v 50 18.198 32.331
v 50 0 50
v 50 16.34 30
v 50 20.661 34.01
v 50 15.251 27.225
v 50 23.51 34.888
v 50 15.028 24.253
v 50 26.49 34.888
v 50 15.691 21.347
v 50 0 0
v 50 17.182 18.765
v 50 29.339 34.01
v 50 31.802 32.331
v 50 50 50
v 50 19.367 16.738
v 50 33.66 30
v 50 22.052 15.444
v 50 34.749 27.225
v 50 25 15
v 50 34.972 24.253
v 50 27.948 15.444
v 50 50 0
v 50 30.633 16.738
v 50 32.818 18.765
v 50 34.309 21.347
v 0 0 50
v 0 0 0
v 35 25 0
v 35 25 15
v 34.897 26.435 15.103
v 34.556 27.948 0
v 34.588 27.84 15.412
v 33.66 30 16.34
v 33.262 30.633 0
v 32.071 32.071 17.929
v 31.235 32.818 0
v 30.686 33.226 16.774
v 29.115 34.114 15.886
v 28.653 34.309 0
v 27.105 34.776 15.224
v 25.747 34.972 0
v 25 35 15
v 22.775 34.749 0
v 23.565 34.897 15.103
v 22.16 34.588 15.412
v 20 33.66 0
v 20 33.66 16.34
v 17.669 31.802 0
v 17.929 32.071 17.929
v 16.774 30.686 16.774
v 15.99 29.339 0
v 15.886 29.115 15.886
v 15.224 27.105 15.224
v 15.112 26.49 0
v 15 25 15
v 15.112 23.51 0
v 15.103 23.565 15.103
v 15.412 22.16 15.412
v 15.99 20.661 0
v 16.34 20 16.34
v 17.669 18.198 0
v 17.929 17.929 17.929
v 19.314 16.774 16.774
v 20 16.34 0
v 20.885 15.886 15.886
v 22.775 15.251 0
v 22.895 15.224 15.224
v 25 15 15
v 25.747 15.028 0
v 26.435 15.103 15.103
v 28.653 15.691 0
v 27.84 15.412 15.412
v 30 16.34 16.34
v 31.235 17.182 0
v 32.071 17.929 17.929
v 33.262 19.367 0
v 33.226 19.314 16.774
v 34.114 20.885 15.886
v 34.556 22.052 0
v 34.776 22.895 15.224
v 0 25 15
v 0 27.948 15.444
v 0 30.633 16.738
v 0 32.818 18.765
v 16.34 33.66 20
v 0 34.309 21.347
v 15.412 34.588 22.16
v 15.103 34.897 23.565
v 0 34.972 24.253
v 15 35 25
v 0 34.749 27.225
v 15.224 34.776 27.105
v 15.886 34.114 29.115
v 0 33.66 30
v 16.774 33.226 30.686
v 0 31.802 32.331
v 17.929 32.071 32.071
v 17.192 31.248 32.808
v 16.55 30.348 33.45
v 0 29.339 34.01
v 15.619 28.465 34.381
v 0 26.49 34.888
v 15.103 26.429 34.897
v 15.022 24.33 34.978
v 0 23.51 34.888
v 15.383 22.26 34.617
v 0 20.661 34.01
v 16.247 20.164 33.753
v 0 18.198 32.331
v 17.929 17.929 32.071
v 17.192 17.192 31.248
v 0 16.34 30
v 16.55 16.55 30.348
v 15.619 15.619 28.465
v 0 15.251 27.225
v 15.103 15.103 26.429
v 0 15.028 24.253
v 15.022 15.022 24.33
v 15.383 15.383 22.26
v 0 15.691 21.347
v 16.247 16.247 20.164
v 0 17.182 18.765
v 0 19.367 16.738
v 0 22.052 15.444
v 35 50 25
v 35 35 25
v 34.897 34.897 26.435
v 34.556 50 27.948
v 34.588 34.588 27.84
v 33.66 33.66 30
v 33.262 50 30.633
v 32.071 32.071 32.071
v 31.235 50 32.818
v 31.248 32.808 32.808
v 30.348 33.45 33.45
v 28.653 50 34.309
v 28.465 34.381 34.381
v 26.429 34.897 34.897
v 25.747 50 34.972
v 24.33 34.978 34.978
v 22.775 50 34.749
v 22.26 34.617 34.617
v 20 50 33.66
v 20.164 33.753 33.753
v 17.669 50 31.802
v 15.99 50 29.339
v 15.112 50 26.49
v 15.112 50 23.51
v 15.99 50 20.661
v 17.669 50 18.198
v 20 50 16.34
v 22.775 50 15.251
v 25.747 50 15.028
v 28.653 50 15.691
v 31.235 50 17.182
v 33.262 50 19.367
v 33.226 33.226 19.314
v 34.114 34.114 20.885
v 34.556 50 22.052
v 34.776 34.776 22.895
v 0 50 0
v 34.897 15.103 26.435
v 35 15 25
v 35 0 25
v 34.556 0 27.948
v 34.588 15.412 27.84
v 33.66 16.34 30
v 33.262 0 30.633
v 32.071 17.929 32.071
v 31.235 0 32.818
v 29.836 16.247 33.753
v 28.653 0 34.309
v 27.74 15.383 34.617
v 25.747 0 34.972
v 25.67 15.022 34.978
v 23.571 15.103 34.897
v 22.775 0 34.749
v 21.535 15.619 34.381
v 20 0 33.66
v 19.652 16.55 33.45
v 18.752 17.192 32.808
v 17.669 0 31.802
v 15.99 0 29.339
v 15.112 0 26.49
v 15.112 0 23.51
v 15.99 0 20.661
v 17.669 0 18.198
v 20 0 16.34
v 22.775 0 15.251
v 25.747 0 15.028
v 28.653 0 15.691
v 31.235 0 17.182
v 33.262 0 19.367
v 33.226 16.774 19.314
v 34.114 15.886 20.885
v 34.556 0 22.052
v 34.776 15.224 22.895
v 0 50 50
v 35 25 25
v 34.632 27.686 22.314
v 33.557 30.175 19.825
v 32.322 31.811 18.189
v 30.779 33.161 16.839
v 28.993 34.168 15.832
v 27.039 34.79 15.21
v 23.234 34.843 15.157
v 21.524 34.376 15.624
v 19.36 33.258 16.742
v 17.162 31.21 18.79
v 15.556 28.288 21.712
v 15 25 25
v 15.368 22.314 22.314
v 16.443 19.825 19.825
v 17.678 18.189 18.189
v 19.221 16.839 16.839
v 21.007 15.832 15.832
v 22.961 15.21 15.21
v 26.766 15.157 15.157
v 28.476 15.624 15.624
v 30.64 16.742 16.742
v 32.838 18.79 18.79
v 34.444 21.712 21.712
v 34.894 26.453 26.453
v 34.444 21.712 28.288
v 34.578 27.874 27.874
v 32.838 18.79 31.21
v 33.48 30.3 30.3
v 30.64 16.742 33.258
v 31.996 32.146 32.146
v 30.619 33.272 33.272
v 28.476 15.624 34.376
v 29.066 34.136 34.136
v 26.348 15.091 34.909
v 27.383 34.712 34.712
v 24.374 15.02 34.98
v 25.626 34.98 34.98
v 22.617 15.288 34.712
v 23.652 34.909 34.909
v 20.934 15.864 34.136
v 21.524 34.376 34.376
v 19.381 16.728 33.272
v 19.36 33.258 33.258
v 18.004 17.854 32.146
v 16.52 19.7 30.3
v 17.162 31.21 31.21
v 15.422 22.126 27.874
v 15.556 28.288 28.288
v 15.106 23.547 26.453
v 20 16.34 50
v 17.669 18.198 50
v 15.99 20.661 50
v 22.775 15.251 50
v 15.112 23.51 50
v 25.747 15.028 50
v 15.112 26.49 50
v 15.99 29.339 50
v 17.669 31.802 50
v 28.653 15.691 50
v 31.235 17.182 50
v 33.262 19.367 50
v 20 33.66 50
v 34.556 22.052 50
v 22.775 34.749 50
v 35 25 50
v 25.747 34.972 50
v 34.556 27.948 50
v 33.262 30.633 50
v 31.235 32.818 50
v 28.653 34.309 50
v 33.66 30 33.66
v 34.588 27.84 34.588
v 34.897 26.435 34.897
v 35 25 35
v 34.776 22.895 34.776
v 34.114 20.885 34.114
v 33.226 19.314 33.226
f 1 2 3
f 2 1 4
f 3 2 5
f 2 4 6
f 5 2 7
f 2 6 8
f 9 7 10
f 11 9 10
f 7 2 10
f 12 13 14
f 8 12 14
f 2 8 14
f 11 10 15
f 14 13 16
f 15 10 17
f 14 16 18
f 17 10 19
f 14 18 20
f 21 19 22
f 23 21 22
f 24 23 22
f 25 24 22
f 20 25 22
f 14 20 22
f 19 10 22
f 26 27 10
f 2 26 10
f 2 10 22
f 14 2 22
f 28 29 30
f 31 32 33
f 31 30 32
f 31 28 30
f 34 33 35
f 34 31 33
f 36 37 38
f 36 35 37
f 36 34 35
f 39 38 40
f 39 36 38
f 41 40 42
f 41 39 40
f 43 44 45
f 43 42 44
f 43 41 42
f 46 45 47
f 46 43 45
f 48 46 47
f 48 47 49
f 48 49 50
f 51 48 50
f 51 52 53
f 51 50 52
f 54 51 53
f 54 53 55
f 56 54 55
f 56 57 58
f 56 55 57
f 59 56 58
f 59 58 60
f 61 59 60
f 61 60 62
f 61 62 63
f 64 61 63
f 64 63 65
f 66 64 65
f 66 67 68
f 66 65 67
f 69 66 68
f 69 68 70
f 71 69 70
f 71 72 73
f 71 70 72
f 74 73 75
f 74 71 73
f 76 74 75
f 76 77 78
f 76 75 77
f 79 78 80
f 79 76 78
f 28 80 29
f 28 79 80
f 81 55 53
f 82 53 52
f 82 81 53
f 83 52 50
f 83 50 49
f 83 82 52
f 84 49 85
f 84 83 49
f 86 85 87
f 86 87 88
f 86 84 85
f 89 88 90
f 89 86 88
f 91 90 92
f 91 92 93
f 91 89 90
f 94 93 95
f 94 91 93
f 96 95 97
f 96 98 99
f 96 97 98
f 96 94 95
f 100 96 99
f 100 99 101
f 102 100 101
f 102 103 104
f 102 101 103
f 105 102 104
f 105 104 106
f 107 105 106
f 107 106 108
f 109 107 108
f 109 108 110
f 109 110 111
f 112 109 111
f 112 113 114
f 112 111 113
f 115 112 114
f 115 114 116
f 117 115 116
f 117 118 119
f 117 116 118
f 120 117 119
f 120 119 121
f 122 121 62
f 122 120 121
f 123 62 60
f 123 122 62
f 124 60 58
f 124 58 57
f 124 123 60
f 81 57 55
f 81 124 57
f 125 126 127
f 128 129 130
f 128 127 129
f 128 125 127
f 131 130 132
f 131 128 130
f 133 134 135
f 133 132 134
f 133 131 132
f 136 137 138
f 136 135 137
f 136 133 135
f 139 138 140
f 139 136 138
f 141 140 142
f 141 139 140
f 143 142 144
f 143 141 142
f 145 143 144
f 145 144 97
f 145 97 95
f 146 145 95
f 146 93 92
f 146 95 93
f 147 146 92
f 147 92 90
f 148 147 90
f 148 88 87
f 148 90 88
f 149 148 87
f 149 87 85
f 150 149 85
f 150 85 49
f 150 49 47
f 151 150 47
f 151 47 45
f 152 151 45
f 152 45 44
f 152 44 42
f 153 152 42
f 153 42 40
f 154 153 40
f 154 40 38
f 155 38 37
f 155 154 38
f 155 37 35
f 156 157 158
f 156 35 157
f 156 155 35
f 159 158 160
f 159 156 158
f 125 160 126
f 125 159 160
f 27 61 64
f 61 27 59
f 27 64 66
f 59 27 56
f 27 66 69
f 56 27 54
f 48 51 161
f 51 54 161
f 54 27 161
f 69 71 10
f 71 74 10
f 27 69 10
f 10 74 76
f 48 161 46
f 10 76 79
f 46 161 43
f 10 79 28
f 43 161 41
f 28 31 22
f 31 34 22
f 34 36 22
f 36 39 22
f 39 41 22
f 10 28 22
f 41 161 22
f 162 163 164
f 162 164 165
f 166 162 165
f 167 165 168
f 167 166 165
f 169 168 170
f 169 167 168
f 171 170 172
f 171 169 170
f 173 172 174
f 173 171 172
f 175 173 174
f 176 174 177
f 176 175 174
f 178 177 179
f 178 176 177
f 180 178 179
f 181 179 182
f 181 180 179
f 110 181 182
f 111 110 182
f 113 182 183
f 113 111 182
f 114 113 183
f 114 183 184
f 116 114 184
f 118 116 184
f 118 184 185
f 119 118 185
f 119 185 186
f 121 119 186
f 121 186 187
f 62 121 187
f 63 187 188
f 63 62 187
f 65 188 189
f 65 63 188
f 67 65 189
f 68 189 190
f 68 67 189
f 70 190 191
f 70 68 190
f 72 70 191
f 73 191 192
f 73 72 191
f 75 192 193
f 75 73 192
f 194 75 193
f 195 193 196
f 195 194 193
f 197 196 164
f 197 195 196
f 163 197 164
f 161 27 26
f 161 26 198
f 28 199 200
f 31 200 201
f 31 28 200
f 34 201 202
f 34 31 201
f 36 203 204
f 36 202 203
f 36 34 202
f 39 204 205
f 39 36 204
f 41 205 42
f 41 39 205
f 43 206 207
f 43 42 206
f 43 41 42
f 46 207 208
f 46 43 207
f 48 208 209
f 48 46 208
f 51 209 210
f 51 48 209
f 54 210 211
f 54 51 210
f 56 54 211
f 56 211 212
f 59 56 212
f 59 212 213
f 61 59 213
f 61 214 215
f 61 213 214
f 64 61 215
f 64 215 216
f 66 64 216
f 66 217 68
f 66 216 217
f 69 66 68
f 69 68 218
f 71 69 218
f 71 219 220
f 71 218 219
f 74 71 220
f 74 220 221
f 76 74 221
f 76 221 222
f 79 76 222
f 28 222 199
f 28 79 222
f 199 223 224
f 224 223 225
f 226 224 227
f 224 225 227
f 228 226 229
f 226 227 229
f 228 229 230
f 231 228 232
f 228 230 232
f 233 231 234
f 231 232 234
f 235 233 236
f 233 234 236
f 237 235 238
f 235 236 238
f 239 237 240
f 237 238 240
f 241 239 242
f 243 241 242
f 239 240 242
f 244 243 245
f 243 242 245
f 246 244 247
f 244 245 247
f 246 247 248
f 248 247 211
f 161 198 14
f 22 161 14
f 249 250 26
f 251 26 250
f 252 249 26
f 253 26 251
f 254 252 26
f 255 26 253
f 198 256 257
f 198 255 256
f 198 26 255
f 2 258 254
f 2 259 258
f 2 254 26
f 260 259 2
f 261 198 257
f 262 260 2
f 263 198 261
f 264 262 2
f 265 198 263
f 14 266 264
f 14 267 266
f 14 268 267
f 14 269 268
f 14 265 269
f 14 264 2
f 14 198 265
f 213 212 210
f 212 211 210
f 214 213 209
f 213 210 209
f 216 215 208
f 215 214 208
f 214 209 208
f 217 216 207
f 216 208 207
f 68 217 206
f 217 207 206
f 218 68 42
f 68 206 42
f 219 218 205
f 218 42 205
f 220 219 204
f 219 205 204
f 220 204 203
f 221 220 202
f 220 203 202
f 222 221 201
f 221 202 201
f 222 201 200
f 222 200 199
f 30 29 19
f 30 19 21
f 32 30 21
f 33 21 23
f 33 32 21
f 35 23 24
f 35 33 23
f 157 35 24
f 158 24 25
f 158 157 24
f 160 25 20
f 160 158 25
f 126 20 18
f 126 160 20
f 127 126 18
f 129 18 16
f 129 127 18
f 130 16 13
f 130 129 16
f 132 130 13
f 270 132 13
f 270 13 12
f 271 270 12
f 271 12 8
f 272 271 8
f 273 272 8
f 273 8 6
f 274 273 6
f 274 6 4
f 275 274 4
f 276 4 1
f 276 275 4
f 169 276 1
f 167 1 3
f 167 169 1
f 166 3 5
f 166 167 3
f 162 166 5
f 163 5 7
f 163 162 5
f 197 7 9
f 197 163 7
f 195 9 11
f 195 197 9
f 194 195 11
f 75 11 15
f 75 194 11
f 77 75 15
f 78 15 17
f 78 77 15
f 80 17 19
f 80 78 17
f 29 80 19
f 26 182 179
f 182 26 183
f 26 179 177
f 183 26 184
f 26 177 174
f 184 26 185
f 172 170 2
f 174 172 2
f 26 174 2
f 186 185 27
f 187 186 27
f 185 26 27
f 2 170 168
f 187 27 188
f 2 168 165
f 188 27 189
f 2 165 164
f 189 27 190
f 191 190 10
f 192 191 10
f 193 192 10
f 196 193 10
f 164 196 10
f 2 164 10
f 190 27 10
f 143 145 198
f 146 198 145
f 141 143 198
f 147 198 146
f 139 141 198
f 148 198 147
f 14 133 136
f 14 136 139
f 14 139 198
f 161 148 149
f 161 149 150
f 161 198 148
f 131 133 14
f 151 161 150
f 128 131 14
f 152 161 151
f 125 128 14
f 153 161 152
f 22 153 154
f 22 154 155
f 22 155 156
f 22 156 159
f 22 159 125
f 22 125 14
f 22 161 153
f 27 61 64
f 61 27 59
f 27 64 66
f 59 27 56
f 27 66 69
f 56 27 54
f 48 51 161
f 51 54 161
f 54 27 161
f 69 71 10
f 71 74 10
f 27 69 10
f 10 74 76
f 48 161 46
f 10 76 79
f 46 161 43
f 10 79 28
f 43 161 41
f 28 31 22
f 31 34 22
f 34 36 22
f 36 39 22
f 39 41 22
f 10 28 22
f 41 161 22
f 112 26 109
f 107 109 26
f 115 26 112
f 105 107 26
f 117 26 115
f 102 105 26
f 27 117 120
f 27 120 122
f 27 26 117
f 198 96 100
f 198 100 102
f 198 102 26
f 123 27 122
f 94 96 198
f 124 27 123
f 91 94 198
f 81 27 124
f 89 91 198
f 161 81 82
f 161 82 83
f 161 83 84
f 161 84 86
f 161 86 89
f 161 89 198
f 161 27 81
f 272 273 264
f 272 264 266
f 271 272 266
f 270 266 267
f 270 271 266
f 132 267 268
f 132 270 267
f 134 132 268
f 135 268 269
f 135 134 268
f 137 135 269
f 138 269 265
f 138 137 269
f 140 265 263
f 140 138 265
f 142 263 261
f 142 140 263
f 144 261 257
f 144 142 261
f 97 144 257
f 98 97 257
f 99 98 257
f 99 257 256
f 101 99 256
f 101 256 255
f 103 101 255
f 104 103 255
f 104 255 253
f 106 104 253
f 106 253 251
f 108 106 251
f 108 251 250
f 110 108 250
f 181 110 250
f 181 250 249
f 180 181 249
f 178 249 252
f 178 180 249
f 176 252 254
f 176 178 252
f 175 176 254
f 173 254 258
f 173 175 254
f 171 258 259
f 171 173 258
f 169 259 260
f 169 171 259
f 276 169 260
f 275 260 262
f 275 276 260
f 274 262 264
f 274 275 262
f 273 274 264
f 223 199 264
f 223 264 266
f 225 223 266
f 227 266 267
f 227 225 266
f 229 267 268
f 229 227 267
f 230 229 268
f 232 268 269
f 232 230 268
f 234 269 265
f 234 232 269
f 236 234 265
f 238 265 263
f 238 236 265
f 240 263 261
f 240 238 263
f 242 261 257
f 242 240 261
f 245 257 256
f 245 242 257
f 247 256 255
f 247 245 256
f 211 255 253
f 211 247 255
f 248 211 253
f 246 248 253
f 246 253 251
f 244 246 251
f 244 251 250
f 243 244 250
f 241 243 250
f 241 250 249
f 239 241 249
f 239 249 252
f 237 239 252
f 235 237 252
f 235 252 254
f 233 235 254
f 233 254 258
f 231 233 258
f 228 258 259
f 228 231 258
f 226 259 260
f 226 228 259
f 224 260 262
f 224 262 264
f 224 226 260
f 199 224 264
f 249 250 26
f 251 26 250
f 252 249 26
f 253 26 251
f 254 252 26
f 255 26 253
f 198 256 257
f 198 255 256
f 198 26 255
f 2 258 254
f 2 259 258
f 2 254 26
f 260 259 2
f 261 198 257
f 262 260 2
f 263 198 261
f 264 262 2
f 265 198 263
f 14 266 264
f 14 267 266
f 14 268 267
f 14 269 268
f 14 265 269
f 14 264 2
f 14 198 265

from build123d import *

# Parameters (mm, degrees)
CYLINDER1_R     = 10
CYLINDER1_DEPTH = 50
CYLINDER_R      = 10
CYLINDER_DEPTH  = 50
BOX_W           = 50
BOX_H           = 50
BOX_DEPTH       = 50
CYLINDER2_R     = 10
CYLINDER2_DEPTH = 50


with BuildPart() as cylinder1:
    # Cylinder1 → Cylinder1 (new body)
    with BuildSketch(Plane(origin=(25, 50, 25), x_dir=(1, 0, 0), z_dir=(0, -1, 0))):
        Circle(CYLINDER1_R)
    extrude(amount=CYLINDER1_DEPTH)


with BuildPart() as cylinder:
    # Cylinder → Cylinder (new body)
    with BuildSketch(Plane(origin=(25, 25, 0), x_dir=(1, 0, 0), z_dir=(0, 0, 1))):
        Circle(CYLINDER_R)
    extrude(amount=CYLINDER_DEPTH)


with BuildPart() as cut:
    # Box → Box (new body)
    with BuildSketch(Plane.XY):
        with Locations((25, 25)):
            Rectangle(BOX_W, BOX_H)
    extrude(amount=BOX_DEPTH)

    # Cut: cut Cylinder
    add(cylinder.part, mode=Mode.SUBTRACT)


with BuildPart() as fusion:
    # Fusion base: copy of Cut
    add(cut.part)

    # Fusion: union Cylinder1
    add(cylinder1.part)


with BuildPart() as cylinder2:
    # Cylinder2 → Cylinder2 (new body)
    with BuildSketch(Plane(origin=(0, 25, 25), x_dir=(0, 0, -1), z_dir=(1, 0, 0))):
        Circle(CYLINDER2_R)
    extrude(amount=CYLINDER2_DEPTH)


with BuildPart() as cut2:
    # Cut1 base: copy of Cut
    add(cut.part)

    # Cut1: cut Cylinder1
    add(cylinder1.part, mode=Mode.SUBTRACT)

    # Cut2: cut Cylinder2
    add(cylinder2.part, mode=Mode.SUBTRACT)


solid = Compound([fusion.part, cut2.part])
